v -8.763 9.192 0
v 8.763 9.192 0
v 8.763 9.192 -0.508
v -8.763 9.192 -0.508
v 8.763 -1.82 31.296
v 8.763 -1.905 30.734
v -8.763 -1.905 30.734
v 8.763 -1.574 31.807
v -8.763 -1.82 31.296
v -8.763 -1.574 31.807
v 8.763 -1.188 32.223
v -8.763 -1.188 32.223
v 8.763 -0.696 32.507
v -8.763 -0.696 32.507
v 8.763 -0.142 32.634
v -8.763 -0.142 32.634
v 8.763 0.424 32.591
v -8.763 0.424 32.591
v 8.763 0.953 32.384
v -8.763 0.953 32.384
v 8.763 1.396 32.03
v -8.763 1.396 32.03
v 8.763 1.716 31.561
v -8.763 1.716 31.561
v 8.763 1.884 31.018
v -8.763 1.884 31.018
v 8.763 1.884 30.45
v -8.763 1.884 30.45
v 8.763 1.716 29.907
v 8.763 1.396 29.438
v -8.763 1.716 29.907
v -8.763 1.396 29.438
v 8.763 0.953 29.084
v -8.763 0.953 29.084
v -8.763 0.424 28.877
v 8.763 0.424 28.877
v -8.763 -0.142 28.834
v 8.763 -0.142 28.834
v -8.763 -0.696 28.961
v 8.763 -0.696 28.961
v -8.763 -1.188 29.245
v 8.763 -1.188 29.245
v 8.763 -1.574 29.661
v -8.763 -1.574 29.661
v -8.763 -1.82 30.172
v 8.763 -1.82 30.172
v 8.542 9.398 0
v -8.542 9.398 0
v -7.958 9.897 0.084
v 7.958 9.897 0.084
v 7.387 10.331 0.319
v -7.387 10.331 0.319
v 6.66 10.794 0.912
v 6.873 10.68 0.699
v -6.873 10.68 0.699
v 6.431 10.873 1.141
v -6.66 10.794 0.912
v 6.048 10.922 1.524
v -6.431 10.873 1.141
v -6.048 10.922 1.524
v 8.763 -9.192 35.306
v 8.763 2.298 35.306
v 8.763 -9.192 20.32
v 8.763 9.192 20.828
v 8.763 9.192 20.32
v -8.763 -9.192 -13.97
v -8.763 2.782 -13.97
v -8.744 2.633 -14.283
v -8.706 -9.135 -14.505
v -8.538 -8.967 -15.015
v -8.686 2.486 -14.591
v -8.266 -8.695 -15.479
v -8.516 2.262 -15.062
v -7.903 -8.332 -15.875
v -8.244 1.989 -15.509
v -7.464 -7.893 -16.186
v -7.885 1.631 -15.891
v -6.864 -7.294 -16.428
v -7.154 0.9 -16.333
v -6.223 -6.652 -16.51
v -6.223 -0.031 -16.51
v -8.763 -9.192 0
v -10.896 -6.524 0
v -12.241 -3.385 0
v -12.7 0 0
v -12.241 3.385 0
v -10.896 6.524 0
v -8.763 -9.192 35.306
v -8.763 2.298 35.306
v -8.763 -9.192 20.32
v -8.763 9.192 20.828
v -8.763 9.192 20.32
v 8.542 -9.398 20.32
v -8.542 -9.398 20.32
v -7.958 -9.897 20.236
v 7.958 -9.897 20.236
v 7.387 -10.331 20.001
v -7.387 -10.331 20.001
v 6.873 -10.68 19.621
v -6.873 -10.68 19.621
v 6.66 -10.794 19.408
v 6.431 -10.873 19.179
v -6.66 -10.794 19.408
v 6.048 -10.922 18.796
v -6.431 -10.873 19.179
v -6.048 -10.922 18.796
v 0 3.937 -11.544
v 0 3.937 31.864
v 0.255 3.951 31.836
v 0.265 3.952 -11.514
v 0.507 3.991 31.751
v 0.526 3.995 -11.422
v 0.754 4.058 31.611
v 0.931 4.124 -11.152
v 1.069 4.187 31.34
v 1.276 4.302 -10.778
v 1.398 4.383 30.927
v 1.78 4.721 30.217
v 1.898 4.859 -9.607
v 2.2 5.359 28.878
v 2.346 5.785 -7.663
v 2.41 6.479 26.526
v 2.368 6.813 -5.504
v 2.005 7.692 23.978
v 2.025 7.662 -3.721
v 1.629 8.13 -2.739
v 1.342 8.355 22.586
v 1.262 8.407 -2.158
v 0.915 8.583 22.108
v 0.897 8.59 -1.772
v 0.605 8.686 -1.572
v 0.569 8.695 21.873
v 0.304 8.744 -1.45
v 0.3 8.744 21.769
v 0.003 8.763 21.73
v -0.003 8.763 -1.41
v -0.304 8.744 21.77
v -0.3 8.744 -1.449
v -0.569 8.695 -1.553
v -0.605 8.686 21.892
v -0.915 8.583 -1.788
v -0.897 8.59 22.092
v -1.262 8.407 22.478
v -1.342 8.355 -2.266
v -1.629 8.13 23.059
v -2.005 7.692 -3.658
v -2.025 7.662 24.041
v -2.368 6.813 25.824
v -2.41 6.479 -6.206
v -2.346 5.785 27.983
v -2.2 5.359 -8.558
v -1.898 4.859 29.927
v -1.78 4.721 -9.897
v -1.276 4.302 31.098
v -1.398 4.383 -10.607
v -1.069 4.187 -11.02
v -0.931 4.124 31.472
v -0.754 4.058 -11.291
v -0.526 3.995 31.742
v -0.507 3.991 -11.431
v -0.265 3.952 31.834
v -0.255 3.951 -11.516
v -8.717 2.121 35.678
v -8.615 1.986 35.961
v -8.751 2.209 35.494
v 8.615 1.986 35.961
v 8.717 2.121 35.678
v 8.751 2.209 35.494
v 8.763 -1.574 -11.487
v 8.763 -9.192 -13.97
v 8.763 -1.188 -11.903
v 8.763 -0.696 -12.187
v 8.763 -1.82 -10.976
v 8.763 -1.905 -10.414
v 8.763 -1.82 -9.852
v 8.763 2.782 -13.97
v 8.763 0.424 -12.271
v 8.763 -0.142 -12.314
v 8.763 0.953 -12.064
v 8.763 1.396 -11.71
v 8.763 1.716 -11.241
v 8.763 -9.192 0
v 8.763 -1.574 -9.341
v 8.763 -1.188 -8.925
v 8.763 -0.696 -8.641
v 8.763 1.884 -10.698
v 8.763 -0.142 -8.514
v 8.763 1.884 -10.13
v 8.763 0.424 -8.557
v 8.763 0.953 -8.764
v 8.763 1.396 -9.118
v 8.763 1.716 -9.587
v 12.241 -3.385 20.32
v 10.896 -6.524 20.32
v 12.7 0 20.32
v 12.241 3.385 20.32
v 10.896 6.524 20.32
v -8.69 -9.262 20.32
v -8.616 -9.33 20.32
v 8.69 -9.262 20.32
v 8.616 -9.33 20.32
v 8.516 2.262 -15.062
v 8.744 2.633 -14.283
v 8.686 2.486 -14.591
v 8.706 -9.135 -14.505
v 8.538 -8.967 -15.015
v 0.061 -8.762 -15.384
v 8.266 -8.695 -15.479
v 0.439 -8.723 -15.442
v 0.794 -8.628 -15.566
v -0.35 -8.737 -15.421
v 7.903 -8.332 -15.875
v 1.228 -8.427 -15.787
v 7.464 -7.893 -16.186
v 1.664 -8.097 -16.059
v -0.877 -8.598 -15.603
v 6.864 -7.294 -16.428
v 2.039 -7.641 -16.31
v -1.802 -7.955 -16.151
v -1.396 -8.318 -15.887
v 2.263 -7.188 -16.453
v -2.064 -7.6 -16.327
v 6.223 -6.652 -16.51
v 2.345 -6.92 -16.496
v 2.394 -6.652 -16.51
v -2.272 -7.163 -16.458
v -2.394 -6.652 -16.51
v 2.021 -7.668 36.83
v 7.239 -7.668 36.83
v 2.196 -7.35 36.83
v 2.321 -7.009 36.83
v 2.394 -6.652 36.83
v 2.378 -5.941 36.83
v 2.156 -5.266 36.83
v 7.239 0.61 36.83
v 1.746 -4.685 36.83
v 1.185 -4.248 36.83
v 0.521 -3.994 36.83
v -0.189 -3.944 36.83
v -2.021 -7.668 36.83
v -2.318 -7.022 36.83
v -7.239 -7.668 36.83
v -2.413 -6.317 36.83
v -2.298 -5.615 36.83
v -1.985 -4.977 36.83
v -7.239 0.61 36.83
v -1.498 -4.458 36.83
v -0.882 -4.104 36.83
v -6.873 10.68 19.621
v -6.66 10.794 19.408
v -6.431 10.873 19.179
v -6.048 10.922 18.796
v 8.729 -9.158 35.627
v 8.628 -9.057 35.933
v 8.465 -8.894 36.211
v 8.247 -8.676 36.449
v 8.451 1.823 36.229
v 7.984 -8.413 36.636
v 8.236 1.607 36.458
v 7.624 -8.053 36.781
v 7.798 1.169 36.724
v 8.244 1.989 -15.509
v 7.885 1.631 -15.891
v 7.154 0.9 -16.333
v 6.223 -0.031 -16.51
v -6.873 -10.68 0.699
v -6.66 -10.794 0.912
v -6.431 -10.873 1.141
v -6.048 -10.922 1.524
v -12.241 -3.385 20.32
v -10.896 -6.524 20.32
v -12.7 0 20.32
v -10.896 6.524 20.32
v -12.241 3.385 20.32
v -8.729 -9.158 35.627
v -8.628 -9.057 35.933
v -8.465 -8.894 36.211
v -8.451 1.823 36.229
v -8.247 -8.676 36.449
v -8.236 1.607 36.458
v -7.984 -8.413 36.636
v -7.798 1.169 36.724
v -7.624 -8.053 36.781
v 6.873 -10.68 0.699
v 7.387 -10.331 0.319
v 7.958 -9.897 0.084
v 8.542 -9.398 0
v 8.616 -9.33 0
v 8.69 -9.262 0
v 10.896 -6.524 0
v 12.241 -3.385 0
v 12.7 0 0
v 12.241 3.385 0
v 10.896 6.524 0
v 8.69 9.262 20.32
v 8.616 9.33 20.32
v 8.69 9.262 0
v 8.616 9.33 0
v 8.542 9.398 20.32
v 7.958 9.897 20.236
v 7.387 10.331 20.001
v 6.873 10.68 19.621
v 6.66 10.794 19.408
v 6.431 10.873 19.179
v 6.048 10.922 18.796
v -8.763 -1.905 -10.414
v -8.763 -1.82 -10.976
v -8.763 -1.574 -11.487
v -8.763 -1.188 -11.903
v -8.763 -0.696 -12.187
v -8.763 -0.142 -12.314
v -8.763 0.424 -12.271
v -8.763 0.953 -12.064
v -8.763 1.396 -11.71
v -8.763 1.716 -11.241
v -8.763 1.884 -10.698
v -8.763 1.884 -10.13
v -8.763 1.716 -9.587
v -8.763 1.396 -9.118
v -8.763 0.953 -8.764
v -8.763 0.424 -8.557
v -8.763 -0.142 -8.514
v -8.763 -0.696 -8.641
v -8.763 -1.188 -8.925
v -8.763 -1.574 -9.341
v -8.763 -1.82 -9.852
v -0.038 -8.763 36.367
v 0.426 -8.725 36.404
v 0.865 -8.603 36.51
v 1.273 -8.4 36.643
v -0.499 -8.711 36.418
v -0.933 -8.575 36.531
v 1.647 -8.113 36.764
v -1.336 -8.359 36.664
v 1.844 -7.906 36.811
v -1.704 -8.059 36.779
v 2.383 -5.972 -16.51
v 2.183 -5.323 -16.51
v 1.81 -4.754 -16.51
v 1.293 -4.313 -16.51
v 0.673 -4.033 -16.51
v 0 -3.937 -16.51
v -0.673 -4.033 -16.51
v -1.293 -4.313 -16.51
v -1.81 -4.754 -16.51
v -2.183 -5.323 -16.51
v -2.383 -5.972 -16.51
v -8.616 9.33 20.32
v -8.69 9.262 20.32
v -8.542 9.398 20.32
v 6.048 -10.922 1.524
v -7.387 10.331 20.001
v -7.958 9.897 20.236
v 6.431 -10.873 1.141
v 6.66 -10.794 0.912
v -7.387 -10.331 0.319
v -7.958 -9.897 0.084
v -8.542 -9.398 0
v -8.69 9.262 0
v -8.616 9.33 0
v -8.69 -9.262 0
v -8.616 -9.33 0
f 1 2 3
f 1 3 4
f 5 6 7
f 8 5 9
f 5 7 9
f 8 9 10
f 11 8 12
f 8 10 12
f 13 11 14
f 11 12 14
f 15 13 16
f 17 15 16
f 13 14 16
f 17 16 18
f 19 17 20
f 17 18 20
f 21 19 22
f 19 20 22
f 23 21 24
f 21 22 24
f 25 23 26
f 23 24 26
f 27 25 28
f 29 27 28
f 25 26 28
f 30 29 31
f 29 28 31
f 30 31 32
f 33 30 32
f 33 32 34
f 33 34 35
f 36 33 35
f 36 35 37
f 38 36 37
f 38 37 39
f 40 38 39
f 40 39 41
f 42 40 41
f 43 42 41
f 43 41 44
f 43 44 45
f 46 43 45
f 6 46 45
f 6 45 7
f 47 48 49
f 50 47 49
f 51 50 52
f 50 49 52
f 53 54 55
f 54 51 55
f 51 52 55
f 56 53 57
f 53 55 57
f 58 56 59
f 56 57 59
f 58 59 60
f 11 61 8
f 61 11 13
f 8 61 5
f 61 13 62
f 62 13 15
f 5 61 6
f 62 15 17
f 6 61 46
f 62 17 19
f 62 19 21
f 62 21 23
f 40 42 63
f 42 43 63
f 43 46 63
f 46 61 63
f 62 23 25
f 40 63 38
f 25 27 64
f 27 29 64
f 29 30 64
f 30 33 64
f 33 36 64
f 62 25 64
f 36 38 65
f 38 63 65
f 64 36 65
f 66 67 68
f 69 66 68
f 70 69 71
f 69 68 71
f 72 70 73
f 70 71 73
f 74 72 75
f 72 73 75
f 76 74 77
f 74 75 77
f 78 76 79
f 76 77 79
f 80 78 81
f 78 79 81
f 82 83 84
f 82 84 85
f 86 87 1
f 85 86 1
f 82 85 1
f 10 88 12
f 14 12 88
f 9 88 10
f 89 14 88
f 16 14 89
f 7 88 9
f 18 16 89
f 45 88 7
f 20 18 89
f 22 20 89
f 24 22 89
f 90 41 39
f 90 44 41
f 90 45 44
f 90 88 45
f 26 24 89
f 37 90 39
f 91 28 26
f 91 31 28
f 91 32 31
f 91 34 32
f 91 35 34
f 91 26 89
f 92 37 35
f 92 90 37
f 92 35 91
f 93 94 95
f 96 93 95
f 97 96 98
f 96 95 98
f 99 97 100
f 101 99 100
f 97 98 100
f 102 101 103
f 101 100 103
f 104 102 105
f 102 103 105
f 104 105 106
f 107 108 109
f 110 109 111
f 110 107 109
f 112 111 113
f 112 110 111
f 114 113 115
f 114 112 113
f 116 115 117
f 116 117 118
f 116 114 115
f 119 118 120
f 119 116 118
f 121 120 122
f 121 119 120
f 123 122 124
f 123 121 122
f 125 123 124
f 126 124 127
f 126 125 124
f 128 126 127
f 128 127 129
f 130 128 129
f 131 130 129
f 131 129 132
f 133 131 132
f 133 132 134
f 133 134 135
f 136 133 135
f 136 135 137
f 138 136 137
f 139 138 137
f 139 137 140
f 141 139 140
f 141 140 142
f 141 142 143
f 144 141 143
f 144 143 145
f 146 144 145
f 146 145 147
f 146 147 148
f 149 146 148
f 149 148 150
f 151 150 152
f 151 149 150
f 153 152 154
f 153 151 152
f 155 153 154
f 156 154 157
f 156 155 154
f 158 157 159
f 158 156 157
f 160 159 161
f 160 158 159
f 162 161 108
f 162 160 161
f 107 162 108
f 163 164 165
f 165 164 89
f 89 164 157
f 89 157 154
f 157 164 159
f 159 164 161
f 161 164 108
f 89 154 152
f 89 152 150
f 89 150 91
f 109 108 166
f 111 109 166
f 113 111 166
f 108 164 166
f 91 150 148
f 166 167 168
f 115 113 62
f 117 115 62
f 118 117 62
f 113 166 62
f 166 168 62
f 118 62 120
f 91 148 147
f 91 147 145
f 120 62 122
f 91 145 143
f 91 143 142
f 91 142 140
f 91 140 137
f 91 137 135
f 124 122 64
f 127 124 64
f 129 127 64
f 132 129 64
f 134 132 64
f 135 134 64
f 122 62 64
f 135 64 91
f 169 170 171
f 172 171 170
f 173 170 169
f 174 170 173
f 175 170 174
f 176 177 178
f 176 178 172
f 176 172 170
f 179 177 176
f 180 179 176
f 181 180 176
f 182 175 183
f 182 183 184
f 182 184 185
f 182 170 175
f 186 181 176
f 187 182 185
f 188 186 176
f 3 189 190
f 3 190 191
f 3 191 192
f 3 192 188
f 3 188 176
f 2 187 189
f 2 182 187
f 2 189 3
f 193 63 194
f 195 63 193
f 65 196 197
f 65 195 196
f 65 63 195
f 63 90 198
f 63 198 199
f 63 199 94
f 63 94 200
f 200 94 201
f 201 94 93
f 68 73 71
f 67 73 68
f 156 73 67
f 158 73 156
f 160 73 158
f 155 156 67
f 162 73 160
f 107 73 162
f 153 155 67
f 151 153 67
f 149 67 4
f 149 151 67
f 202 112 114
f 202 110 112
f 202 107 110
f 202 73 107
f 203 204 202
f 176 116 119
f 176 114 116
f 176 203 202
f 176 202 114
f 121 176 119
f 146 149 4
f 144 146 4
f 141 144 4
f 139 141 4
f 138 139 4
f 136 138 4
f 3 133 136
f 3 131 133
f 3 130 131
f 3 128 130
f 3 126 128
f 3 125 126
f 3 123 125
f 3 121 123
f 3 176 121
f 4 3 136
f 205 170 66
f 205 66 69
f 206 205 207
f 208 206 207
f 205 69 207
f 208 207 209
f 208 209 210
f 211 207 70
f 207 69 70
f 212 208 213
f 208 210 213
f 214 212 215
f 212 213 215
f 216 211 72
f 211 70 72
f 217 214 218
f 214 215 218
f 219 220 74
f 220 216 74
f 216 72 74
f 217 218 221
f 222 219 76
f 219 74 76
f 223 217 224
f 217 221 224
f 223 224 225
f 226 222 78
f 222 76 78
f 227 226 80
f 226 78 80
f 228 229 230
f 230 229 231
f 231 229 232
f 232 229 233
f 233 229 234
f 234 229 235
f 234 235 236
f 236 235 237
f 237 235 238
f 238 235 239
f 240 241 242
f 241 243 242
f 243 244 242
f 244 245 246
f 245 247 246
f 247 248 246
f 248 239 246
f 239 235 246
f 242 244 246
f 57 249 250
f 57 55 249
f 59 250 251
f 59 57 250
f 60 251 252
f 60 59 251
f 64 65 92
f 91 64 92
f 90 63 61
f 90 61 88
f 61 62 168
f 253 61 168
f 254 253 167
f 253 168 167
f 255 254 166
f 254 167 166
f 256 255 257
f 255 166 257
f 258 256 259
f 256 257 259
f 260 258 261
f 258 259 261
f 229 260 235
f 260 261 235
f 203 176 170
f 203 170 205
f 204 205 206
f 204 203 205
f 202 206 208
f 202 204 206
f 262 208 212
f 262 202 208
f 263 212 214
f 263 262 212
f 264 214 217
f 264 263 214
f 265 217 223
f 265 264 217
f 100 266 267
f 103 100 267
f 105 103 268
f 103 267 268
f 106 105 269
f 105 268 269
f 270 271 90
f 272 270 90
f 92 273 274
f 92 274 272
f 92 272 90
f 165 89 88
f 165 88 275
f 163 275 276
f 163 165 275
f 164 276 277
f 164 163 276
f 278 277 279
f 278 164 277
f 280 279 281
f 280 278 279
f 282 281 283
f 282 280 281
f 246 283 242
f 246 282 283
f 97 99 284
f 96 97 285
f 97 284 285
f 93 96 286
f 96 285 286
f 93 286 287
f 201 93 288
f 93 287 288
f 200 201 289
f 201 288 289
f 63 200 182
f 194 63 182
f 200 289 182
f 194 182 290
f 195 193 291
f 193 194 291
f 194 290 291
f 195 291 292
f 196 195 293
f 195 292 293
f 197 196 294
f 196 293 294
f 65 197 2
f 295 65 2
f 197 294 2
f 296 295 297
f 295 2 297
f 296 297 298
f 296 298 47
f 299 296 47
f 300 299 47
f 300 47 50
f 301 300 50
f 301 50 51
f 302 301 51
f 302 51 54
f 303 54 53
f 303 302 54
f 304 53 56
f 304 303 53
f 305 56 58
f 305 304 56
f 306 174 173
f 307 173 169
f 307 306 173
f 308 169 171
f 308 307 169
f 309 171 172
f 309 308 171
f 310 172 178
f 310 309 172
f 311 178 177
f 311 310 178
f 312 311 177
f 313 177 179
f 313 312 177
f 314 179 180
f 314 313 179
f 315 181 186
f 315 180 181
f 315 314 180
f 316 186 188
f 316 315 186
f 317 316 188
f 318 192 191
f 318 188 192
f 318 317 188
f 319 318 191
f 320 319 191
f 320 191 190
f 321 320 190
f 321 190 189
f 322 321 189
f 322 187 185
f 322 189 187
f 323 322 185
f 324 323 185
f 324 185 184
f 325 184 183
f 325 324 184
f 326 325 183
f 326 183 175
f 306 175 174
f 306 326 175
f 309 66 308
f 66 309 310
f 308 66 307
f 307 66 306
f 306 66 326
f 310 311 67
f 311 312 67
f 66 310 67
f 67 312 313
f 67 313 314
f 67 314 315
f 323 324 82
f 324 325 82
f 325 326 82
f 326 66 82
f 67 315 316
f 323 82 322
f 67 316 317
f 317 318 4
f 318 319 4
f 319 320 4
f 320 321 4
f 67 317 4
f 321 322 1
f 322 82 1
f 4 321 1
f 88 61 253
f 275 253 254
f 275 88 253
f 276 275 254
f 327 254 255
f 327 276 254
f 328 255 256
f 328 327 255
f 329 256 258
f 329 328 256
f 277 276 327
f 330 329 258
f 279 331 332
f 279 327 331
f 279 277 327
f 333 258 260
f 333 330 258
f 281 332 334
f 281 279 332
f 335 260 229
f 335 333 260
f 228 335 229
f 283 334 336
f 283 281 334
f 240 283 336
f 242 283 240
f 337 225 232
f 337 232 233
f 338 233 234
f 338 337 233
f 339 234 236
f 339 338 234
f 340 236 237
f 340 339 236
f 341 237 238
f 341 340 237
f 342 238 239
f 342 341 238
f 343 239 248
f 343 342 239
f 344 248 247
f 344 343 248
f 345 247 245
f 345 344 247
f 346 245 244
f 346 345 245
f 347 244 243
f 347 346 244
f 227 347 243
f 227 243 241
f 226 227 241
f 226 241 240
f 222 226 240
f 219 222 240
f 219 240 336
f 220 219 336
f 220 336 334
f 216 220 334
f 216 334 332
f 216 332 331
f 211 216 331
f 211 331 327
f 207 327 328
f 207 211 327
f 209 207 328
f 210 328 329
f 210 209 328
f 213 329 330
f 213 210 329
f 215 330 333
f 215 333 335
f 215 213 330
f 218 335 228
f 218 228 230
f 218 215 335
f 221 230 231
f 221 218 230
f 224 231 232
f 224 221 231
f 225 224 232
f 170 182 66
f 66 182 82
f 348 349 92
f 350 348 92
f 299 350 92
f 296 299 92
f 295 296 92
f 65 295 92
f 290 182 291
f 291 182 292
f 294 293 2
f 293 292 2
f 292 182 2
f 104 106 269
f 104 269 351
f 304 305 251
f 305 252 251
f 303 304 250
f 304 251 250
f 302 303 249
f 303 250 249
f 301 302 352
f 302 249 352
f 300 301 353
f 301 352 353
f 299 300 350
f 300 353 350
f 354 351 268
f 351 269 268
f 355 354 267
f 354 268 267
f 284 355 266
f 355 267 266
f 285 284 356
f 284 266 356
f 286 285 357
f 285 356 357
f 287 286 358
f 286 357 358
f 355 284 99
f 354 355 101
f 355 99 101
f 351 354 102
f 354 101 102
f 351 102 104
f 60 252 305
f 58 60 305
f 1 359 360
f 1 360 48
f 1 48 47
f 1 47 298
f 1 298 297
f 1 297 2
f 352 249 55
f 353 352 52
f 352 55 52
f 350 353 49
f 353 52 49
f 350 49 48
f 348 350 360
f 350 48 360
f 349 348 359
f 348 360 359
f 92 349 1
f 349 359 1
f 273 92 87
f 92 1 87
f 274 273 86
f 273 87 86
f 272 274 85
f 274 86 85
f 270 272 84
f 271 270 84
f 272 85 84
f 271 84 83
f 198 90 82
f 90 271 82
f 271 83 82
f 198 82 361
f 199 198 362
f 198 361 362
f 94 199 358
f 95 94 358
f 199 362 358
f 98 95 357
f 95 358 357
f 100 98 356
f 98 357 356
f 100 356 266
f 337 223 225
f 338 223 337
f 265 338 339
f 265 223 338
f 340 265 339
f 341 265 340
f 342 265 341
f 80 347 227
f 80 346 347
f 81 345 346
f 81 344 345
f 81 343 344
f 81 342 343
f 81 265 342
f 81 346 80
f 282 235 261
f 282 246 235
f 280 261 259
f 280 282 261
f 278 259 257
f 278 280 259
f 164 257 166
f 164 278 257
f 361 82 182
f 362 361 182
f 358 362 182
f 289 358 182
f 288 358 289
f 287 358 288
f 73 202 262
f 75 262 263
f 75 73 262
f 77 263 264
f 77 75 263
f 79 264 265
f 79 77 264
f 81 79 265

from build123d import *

# Parameters (mm, degrees)
SKETCH1_R               = 12.7
FINGERBODY_DEPTH        = 20.32
SKETCH2_W               = 17.526
SKETCH2_H               = 18.384757926
BOSS_EXTRUDE2_DEPTH     = 16.51
SKETCH4_R               = 1.905
CUT_EXTRUDE2_DEPTH      = 45.479200409
CUT_EXTRUDE3_DEPTH      = 45.479200409
FILLET2_R               = 2.54
CUT_EXTRUDE5_DEPTH      = 41.975955144
FILLET3_R               = 1.524
FILLET4_R               = 1.524
FILLET6_R               = 1.524
CUT_EXTRUDE6_DEPTH      = 41.460214887
CUT_EXTRUDE6_DEPTH_BACK = 41.460214887
SKETCH11_R              = 2.413


with BuildPart() as part:
    # Sketch1 → FingerBody (new body)
    with BuildSketch(Plane.XY):
        Circle(SKETCH1_R)
    extrude(amount=FINGERBODY_DEPTH)

    # Sketch2 → Boss-Extrude2 (add)
    with BuildSketch(Plane(origin=(0, 0, 0), x_dir=(-1, 0, 0), z_dir=(0, 0, -1))):
        Rectangle(SKETCH2_W, SKETCH2_H)
    boss_extrude2 = extrude(amount=BOSS_EXTRUDE2_DEPTH)

    # Mirror1: Boss-Extrude2 across plane
    add(boss_extrude2.mirror(Plane(origin=(0, 0, 10.16), x_dir=(1, 0, 0), z_dir=(0, 0, -1))))

    # Sketch4 → Cut-Extrude2 (cut, through all)
    with BuildSketch(Plane.ZY.offset(8.763)):
        with Locations(Location((30.734, 0, 0), (0, 0, 270))):
            Circle(SKETCH4_R)
    cut_extrude2 = extrude(amount=-CUT_EXTRUDE2_DEPTH, mode=Mode.SUBTRACT)

    # Mirror2: Cut-Extrude2 across plane
    add(cut_extrude2.mirror(Plane(origin=(0, 0, 10.16), x_dir=(1, 0, 0), z_dir=(0, 0, -1))), mode=Mode.SUBTRACT)

    # Sketch5 → Cut-Extrude3 (cut, through all)
    with BuildSketch(Plane(origin=(8.763, 0, 0), x_dir=(0, 0, -1), z_dir=(1, 0, 0))):
        Polygon((16.51, 1.572378963), (0.508, 9.192378963), (16.51, 9.192378963), align=None)
    cut_extrude3 = extrude(amount=-CUT_EXTRUDE3_DEPTH, mode=Mode.SUBTRACT)

    # Fillet2
    fillet2_edges = [part.edges().sort_by_distance(p)[0] for p in [
        (0, -9.192378963, -16.51),
        (8.763, -3.81, -16.51),
        (0, 1.572378963, -16.51),
        (-8.763, -3.81, -16.51),
    ]]
    fillet(fillet2_edges, radius=FILLET2_R)

    # Mirror6: Cut-Extrude3 across plane
    add(cut_extrude3.mirror(Plane(origin=(0, 0, 10.16), x_dir=(1, 0, 0), z_dir=(0, 0, -1))), mode=Mode.SUBTRACT)

    # Sketch8 → Cut-Extrude5 (cut, symmetric)
    with BuildSketch(Plane(origin=(0, 0, 0), x_dir=(-1, 0, 0), z_dir=(0, 0, -1))):
        with BuildLine():
            Line((6.480734218, 10.922), (-6.480734218, 10.922))
            ThreePointArc((-6.480734218, 10.922), (0, 12.7), (6.480734218, 10.922))
        make_face()
    cut_extrude5 = extrude(amount=CUT_EXTRUDE5_DEPTH, both=True, mode=Mode.SUBTRACT)

    # Mirror7: Cut-Extrude5 across plane
    add(cut_extrude5.mirror(Plane(origin=(0, 0, 0), x_dir=(0, 0, 1), z_dir=(0, -1, 0))), mode=Mode.SUBTRACT)

    # Fillet3
    fillet3_edges = [part.edges().sort_by_distance(p)[0] for p in [
        (6.480734218, 10.922, 10.16),
        (-6.480734218, 10.922, 10.16),
        (0, 10.922, 20.32),
        (0, 10.922, 0),
    ]]
    fillet(fillet3_edges, radius=FILLET3_R)

    # Fillet4
    fillet4_edges = [part.edges().sort_by_distance(p)[0] for p in [
        (6.480734218, -10.922, 10.16),
        (-6.480734218, -10.922, 10.16),
        (0, -10.922, 20.32),
        (0, -10.922, 0),
    ]]
    fillet(fillet4_edges, radius=FILLET4_R)

    # Fillet6
    fillet6_edges = [part.edges().sort_by_distance(p)[0] for p in [
        (-8.763, -3.81, 36.83),
        (0, -9.192378963, 36.83),
        (8.763, -3.81, 36.83),
        (0, 1.572378963, 36.83),
    ]]
    fillet(fillet6_edges, radius=FILLET6_R)

    # Sketch11 → Cut-Extrude6 (cut, two sides: drawn at the far end of the back side and taken through both)
    with BuildSketch(Plane.XY.offset(20.32).offset(-CUT_EXTRUDE6_DEPTH_BACK)):
        with Locations(Location((0, 6.35, 0), (0, 0, 270))):
            Circle(SKETCH11_R)
        with Locations(Location((0, -6.35, 0), (0, 0, 352.801199766))):
            Circle(SKETCH11_R)
    extrude(amount=CUT_EXTRUDE6_DEPTH + CUT_EXTRUDE6_DEPTH_BACK, mode=Mode.SUBTRACT)


solid = part.part
